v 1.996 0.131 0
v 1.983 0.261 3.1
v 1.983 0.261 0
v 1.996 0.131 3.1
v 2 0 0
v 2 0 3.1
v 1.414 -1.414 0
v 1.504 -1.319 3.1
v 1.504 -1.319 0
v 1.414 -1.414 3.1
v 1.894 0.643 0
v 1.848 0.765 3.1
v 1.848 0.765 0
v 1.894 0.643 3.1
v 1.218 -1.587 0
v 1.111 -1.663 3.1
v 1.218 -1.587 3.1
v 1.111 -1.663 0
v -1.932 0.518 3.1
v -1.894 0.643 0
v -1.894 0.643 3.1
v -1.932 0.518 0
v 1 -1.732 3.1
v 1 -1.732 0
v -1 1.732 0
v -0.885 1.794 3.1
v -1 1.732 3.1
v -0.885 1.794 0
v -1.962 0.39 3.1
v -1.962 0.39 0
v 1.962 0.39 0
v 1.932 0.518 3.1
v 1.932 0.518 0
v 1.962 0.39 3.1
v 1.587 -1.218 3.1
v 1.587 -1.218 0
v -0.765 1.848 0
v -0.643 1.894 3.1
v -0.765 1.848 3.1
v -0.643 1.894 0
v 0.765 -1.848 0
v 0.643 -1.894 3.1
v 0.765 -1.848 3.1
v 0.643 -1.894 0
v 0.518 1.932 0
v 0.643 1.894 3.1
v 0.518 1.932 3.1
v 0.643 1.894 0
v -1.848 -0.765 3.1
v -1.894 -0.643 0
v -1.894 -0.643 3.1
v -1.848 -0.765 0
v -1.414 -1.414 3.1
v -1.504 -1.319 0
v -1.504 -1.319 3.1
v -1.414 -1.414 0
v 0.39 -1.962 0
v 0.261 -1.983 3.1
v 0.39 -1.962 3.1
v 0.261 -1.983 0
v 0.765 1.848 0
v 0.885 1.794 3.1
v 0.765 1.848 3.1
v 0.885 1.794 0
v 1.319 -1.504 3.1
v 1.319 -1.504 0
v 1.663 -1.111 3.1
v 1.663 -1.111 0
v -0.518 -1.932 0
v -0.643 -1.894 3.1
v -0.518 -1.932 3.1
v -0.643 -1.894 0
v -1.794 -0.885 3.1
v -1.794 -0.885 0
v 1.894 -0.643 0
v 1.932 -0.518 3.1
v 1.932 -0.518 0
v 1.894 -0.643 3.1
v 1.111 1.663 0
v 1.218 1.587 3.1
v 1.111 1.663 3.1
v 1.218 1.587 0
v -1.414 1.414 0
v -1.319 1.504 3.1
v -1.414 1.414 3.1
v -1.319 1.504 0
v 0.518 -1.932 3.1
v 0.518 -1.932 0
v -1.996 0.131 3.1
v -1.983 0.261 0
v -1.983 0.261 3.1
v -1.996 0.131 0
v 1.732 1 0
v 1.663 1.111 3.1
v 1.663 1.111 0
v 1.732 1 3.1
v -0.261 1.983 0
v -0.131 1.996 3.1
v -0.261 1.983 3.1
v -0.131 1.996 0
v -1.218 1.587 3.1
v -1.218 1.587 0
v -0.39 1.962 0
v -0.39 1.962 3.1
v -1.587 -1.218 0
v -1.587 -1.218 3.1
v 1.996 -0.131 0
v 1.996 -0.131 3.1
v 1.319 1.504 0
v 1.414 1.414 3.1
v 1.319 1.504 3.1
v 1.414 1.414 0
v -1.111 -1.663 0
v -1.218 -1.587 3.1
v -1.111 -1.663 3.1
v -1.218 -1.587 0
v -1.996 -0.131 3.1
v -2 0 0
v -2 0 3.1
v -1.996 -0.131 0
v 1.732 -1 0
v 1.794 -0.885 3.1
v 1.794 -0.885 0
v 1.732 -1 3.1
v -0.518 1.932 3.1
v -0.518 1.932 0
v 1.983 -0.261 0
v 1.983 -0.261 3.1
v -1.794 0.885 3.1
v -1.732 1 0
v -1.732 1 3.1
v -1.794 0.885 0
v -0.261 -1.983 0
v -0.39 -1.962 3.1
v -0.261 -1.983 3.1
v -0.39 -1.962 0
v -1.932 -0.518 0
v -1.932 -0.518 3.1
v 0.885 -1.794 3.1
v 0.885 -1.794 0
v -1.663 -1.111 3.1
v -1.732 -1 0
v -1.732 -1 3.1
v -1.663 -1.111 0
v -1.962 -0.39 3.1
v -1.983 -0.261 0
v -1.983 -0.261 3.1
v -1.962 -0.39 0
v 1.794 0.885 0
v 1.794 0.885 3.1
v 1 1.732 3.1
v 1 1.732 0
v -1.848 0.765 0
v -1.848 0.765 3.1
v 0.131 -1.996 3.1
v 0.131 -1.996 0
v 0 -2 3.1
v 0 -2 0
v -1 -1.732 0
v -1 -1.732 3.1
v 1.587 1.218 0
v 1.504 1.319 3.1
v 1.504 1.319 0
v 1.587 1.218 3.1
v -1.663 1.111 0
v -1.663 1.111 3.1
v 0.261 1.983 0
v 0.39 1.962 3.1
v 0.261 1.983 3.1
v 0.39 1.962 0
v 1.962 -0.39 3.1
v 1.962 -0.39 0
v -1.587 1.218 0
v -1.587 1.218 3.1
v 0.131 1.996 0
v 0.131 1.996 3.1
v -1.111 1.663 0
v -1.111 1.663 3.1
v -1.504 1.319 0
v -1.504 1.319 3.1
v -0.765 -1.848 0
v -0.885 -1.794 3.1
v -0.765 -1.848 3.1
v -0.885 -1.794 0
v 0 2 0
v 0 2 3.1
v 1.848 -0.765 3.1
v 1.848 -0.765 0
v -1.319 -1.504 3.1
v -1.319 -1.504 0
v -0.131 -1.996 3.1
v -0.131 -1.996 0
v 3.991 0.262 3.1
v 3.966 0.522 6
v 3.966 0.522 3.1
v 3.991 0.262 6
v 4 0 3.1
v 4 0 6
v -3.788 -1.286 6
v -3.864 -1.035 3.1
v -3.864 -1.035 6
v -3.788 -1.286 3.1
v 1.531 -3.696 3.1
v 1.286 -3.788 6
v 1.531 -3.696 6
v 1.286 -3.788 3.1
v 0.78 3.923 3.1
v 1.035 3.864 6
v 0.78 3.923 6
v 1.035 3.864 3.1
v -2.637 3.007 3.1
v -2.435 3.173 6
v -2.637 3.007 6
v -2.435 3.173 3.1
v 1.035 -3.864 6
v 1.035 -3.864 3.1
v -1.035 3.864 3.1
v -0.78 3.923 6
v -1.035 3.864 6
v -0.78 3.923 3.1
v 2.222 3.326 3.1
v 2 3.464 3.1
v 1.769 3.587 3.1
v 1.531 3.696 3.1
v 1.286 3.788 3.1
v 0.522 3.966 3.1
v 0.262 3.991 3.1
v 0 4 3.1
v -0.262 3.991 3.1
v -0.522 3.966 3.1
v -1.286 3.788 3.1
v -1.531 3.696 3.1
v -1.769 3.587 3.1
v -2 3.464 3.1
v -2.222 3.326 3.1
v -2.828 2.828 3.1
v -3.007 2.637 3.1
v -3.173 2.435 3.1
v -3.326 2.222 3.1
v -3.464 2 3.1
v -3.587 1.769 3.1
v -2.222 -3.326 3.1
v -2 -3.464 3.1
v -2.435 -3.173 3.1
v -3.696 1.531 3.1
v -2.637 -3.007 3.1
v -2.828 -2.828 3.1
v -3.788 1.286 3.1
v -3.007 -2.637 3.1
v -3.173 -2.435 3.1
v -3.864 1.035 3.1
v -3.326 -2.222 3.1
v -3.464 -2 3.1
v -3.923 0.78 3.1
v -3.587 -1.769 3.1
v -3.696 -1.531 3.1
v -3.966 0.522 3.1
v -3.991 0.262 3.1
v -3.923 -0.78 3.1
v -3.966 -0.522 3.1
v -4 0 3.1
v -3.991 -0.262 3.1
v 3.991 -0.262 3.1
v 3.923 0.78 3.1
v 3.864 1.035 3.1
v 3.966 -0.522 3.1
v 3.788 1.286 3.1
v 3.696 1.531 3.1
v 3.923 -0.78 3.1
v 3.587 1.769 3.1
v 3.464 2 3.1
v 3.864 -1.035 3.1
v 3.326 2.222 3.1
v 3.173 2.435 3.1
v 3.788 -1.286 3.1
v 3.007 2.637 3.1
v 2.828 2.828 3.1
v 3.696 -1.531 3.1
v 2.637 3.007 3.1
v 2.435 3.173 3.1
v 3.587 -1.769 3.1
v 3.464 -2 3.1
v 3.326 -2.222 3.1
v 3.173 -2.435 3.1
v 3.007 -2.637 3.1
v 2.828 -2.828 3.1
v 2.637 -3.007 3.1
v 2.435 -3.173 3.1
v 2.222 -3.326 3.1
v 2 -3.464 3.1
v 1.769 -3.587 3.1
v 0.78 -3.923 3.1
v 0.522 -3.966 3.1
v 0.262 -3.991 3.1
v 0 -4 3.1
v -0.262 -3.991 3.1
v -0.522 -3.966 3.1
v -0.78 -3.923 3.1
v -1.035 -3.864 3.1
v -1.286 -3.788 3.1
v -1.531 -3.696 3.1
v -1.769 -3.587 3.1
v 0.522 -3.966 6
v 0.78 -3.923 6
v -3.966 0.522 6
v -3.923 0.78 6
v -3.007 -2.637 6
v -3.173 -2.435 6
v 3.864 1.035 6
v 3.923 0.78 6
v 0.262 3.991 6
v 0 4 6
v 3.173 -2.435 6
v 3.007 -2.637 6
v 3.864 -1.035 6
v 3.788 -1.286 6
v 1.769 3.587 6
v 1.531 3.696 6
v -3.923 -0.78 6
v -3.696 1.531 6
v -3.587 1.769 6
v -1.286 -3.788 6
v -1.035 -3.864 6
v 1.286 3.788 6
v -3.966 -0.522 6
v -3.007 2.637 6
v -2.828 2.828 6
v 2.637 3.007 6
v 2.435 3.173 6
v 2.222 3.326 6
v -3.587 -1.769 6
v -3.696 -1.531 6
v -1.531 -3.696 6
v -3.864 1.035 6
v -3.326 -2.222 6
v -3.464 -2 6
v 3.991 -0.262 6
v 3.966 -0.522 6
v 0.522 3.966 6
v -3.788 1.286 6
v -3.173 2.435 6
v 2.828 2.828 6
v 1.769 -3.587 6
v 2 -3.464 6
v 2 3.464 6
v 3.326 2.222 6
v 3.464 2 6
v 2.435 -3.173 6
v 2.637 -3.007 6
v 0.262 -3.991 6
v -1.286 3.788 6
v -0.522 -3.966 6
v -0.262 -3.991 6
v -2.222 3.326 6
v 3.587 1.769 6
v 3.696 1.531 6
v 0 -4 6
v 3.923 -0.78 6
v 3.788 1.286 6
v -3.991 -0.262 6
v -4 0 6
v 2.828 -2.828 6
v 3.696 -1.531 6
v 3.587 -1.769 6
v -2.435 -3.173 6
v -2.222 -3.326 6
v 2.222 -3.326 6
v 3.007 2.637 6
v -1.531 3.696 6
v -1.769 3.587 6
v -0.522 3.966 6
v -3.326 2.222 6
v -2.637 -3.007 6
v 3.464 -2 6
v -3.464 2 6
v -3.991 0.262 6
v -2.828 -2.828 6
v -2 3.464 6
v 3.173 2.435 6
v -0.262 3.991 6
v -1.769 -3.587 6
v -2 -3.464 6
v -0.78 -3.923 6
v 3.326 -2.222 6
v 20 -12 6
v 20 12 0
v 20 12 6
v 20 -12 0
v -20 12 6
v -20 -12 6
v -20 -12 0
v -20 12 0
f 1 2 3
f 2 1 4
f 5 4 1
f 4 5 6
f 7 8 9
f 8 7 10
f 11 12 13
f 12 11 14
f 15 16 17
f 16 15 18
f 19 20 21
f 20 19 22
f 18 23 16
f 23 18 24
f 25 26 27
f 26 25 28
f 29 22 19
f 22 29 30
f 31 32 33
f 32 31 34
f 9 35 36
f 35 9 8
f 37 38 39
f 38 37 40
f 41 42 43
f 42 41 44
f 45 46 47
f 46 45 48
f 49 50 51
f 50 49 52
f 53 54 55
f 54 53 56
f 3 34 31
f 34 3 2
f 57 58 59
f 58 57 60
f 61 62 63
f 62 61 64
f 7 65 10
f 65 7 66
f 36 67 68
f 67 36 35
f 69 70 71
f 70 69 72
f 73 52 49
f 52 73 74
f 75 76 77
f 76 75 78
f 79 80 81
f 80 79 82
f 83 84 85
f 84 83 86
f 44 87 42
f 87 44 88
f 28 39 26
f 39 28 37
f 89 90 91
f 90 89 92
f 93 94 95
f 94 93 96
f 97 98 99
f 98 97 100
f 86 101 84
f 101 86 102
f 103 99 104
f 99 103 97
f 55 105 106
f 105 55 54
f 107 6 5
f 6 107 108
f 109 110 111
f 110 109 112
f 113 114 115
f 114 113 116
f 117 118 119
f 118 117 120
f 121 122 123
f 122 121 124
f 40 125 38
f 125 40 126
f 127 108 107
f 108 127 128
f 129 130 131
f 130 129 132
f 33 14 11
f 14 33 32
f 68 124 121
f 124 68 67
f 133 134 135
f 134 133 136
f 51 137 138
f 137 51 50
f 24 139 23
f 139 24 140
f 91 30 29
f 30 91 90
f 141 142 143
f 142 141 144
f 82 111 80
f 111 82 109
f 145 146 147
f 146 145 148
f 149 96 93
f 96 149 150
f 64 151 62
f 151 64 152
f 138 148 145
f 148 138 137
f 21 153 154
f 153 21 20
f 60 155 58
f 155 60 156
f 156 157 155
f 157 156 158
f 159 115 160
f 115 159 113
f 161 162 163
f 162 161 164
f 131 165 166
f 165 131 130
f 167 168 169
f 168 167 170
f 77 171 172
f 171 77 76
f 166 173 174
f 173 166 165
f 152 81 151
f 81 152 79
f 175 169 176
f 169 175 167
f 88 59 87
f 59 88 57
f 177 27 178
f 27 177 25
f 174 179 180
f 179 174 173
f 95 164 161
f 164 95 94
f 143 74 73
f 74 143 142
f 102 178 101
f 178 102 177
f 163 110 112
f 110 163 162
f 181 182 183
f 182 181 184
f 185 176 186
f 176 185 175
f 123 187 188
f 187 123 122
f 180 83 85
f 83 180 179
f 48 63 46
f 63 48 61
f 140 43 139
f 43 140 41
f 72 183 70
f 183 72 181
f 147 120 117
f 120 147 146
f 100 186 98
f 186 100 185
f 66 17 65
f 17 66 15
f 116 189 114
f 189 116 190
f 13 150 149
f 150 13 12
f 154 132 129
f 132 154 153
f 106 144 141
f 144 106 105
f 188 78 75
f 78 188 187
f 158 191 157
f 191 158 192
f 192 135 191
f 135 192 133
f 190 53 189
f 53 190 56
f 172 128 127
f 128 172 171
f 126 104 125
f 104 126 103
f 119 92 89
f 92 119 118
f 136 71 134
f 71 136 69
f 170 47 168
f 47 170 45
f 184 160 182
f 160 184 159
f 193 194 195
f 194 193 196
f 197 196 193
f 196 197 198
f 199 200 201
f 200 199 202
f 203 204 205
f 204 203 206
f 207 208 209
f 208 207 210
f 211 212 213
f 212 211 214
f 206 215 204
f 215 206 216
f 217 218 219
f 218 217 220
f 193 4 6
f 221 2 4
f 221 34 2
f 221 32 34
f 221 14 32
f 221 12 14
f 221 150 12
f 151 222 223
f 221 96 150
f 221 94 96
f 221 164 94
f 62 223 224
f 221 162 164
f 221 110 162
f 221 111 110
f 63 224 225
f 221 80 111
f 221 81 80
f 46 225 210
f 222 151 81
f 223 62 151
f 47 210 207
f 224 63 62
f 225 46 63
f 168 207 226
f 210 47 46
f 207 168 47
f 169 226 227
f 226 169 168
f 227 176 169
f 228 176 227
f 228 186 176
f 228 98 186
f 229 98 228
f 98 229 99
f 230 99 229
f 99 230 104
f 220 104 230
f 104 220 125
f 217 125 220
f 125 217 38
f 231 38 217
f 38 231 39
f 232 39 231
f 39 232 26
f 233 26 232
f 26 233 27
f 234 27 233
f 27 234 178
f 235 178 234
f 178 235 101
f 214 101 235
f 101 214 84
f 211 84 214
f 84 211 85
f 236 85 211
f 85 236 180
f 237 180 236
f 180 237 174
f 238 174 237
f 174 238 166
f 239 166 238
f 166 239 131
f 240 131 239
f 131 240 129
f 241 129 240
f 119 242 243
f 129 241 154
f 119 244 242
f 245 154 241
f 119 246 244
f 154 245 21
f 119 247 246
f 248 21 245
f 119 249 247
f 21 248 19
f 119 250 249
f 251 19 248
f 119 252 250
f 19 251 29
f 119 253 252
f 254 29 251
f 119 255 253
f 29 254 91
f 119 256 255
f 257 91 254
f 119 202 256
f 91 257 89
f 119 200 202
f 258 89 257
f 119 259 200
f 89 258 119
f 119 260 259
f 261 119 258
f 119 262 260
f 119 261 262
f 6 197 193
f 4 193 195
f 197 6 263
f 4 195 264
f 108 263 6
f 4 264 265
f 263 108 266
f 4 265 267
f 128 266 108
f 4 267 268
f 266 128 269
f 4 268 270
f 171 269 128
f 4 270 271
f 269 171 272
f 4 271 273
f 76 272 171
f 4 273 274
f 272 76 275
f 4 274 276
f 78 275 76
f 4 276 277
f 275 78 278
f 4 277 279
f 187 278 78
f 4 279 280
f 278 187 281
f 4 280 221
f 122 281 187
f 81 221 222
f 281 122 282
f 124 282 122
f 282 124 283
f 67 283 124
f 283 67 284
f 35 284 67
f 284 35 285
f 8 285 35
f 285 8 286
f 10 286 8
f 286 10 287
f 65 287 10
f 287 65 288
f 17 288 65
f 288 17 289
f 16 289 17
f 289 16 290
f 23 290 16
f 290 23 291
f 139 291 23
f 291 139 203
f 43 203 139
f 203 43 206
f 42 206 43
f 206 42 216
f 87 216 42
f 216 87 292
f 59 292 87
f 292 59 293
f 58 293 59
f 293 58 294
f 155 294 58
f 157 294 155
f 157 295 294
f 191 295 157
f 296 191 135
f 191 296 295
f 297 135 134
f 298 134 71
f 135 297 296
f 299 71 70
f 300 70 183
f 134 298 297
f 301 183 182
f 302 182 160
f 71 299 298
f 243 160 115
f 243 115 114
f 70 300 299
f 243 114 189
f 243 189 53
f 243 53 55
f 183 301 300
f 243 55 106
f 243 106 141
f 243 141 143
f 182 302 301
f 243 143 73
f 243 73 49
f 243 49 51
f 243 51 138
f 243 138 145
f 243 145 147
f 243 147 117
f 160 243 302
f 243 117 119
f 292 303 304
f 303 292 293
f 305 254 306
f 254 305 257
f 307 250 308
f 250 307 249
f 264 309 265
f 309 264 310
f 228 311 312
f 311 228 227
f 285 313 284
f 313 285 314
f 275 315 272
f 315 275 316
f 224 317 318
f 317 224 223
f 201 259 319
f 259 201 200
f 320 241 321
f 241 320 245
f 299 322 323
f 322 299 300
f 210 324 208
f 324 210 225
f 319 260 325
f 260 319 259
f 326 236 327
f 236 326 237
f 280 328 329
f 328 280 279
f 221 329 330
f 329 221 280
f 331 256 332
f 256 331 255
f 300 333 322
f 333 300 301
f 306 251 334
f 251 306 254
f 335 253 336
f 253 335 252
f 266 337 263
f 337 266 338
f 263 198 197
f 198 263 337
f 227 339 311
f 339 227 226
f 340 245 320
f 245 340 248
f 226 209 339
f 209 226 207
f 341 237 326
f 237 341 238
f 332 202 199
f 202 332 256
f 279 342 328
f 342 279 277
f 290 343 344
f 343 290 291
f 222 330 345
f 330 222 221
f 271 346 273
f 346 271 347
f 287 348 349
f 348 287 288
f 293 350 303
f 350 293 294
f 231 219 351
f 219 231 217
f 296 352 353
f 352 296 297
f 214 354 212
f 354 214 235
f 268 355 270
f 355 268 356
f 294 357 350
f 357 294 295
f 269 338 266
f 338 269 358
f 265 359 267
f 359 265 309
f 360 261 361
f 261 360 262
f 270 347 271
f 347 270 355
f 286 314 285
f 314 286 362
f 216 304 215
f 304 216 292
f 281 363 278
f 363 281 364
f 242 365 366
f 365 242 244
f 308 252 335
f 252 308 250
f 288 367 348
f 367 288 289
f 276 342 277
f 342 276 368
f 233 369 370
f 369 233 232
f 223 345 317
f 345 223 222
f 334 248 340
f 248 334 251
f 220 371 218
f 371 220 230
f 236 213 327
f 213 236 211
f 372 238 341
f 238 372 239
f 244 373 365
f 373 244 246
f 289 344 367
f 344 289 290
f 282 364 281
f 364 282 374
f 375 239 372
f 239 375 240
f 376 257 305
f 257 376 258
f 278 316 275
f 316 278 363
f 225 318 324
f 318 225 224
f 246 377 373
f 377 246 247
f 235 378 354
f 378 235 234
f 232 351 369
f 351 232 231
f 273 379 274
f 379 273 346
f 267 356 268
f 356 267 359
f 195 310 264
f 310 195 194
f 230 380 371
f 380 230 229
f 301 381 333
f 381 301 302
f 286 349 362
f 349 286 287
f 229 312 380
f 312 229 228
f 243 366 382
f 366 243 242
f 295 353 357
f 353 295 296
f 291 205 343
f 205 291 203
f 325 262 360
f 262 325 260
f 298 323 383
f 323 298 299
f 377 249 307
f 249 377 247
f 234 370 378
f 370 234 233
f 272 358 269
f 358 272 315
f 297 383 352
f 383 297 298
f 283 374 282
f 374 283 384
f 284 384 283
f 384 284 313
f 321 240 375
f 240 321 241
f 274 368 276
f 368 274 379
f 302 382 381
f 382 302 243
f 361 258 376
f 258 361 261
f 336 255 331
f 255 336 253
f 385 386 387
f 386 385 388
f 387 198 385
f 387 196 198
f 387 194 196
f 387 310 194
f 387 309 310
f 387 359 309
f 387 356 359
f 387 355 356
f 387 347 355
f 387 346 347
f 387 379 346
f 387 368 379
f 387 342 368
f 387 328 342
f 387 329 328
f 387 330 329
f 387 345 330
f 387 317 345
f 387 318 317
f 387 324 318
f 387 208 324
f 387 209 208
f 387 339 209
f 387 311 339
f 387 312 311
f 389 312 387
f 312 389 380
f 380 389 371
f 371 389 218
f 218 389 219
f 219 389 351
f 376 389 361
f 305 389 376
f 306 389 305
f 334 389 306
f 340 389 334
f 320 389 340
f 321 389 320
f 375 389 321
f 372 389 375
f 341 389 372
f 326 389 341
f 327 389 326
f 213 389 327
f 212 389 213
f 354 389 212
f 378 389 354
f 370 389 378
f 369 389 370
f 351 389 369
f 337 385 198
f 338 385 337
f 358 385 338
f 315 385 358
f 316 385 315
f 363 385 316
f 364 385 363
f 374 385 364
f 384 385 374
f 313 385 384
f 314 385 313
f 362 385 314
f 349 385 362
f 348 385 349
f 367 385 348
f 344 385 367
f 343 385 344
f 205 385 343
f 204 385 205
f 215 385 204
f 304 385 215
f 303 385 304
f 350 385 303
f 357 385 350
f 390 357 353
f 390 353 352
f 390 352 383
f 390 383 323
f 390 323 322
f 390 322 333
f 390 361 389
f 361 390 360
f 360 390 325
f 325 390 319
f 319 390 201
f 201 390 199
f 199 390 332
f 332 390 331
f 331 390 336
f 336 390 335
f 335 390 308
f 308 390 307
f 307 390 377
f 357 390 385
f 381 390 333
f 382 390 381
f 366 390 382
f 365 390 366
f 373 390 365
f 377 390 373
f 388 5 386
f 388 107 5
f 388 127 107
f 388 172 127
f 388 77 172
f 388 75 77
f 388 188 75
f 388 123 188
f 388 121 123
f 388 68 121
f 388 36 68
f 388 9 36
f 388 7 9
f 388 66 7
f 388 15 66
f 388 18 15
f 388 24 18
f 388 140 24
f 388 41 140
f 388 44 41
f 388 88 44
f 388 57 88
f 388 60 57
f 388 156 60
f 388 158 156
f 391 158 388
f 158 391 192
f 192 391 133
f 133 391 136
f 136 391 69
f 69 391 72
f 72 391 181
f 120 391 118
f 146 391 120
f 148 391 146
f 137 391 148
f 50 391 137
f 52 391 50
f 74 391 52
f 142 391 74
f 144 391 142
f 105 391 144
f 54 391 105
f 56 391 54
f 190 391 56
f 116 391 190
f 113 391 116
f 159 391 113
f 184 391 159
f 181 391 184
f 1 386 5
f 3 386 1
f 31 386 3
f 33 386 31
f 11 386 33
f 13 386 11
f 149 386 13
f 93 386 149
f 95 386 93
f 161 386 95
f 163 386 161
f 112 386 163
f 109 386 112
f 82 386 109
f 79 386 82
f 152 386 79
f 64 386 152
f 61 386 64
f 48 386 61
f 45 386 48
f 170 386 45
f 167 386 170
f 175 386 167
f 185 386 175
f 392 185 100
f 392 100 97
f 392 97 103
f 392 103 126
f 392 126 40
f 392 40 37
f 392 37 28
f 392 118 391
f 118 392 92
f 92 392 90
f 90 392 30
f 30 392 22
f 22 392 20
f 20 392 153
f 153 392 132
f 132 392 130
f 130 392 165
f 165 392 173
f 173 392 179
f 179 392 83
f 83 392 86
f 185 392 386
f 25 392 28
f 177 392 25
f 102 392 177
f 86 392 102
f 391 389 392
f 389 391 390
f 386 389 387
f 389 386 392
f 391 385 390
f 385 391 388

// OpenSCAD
// Auto-generated from tests/data/feature_fixtures_manifest.json
// fixture: plate_single_counterbore
// fixture_type: plate
// description: One stepped counterbore hole in a thicker plate.
$fn = 96;

plate_size = [40.000000, 24.000000, 6.000000];
plate_origin = [-20.000000, -12.000000, 0.000000];

module through_hole(center, diameter, height) {
  translate(center) cylinder(d=diameter, h=height, center=false);
}

module through_slot(start, end, width, height) {
  hull() {
    through_hole(start, width, height);
    through_hole(end, width, height);
  }
}

module counterbore_hole(center, through_d, bore_d, bore_depth, height) {
  translate(center) cylinder(d=through_d, h=height, center=false);
  translate([center[0], center[1], center[2] + height - bore_depth])
    cylinder(d=bore_d, h=bore_depth + 0.1, center=false);
}

difference() {
  translate(plate_origin) cube(plate_size);
  counterbore_hole([0.000000, 0.000000, -0.100000], 4.000000, 8.000000, 3.000000, 6.200000);  // counterbore_0
}
